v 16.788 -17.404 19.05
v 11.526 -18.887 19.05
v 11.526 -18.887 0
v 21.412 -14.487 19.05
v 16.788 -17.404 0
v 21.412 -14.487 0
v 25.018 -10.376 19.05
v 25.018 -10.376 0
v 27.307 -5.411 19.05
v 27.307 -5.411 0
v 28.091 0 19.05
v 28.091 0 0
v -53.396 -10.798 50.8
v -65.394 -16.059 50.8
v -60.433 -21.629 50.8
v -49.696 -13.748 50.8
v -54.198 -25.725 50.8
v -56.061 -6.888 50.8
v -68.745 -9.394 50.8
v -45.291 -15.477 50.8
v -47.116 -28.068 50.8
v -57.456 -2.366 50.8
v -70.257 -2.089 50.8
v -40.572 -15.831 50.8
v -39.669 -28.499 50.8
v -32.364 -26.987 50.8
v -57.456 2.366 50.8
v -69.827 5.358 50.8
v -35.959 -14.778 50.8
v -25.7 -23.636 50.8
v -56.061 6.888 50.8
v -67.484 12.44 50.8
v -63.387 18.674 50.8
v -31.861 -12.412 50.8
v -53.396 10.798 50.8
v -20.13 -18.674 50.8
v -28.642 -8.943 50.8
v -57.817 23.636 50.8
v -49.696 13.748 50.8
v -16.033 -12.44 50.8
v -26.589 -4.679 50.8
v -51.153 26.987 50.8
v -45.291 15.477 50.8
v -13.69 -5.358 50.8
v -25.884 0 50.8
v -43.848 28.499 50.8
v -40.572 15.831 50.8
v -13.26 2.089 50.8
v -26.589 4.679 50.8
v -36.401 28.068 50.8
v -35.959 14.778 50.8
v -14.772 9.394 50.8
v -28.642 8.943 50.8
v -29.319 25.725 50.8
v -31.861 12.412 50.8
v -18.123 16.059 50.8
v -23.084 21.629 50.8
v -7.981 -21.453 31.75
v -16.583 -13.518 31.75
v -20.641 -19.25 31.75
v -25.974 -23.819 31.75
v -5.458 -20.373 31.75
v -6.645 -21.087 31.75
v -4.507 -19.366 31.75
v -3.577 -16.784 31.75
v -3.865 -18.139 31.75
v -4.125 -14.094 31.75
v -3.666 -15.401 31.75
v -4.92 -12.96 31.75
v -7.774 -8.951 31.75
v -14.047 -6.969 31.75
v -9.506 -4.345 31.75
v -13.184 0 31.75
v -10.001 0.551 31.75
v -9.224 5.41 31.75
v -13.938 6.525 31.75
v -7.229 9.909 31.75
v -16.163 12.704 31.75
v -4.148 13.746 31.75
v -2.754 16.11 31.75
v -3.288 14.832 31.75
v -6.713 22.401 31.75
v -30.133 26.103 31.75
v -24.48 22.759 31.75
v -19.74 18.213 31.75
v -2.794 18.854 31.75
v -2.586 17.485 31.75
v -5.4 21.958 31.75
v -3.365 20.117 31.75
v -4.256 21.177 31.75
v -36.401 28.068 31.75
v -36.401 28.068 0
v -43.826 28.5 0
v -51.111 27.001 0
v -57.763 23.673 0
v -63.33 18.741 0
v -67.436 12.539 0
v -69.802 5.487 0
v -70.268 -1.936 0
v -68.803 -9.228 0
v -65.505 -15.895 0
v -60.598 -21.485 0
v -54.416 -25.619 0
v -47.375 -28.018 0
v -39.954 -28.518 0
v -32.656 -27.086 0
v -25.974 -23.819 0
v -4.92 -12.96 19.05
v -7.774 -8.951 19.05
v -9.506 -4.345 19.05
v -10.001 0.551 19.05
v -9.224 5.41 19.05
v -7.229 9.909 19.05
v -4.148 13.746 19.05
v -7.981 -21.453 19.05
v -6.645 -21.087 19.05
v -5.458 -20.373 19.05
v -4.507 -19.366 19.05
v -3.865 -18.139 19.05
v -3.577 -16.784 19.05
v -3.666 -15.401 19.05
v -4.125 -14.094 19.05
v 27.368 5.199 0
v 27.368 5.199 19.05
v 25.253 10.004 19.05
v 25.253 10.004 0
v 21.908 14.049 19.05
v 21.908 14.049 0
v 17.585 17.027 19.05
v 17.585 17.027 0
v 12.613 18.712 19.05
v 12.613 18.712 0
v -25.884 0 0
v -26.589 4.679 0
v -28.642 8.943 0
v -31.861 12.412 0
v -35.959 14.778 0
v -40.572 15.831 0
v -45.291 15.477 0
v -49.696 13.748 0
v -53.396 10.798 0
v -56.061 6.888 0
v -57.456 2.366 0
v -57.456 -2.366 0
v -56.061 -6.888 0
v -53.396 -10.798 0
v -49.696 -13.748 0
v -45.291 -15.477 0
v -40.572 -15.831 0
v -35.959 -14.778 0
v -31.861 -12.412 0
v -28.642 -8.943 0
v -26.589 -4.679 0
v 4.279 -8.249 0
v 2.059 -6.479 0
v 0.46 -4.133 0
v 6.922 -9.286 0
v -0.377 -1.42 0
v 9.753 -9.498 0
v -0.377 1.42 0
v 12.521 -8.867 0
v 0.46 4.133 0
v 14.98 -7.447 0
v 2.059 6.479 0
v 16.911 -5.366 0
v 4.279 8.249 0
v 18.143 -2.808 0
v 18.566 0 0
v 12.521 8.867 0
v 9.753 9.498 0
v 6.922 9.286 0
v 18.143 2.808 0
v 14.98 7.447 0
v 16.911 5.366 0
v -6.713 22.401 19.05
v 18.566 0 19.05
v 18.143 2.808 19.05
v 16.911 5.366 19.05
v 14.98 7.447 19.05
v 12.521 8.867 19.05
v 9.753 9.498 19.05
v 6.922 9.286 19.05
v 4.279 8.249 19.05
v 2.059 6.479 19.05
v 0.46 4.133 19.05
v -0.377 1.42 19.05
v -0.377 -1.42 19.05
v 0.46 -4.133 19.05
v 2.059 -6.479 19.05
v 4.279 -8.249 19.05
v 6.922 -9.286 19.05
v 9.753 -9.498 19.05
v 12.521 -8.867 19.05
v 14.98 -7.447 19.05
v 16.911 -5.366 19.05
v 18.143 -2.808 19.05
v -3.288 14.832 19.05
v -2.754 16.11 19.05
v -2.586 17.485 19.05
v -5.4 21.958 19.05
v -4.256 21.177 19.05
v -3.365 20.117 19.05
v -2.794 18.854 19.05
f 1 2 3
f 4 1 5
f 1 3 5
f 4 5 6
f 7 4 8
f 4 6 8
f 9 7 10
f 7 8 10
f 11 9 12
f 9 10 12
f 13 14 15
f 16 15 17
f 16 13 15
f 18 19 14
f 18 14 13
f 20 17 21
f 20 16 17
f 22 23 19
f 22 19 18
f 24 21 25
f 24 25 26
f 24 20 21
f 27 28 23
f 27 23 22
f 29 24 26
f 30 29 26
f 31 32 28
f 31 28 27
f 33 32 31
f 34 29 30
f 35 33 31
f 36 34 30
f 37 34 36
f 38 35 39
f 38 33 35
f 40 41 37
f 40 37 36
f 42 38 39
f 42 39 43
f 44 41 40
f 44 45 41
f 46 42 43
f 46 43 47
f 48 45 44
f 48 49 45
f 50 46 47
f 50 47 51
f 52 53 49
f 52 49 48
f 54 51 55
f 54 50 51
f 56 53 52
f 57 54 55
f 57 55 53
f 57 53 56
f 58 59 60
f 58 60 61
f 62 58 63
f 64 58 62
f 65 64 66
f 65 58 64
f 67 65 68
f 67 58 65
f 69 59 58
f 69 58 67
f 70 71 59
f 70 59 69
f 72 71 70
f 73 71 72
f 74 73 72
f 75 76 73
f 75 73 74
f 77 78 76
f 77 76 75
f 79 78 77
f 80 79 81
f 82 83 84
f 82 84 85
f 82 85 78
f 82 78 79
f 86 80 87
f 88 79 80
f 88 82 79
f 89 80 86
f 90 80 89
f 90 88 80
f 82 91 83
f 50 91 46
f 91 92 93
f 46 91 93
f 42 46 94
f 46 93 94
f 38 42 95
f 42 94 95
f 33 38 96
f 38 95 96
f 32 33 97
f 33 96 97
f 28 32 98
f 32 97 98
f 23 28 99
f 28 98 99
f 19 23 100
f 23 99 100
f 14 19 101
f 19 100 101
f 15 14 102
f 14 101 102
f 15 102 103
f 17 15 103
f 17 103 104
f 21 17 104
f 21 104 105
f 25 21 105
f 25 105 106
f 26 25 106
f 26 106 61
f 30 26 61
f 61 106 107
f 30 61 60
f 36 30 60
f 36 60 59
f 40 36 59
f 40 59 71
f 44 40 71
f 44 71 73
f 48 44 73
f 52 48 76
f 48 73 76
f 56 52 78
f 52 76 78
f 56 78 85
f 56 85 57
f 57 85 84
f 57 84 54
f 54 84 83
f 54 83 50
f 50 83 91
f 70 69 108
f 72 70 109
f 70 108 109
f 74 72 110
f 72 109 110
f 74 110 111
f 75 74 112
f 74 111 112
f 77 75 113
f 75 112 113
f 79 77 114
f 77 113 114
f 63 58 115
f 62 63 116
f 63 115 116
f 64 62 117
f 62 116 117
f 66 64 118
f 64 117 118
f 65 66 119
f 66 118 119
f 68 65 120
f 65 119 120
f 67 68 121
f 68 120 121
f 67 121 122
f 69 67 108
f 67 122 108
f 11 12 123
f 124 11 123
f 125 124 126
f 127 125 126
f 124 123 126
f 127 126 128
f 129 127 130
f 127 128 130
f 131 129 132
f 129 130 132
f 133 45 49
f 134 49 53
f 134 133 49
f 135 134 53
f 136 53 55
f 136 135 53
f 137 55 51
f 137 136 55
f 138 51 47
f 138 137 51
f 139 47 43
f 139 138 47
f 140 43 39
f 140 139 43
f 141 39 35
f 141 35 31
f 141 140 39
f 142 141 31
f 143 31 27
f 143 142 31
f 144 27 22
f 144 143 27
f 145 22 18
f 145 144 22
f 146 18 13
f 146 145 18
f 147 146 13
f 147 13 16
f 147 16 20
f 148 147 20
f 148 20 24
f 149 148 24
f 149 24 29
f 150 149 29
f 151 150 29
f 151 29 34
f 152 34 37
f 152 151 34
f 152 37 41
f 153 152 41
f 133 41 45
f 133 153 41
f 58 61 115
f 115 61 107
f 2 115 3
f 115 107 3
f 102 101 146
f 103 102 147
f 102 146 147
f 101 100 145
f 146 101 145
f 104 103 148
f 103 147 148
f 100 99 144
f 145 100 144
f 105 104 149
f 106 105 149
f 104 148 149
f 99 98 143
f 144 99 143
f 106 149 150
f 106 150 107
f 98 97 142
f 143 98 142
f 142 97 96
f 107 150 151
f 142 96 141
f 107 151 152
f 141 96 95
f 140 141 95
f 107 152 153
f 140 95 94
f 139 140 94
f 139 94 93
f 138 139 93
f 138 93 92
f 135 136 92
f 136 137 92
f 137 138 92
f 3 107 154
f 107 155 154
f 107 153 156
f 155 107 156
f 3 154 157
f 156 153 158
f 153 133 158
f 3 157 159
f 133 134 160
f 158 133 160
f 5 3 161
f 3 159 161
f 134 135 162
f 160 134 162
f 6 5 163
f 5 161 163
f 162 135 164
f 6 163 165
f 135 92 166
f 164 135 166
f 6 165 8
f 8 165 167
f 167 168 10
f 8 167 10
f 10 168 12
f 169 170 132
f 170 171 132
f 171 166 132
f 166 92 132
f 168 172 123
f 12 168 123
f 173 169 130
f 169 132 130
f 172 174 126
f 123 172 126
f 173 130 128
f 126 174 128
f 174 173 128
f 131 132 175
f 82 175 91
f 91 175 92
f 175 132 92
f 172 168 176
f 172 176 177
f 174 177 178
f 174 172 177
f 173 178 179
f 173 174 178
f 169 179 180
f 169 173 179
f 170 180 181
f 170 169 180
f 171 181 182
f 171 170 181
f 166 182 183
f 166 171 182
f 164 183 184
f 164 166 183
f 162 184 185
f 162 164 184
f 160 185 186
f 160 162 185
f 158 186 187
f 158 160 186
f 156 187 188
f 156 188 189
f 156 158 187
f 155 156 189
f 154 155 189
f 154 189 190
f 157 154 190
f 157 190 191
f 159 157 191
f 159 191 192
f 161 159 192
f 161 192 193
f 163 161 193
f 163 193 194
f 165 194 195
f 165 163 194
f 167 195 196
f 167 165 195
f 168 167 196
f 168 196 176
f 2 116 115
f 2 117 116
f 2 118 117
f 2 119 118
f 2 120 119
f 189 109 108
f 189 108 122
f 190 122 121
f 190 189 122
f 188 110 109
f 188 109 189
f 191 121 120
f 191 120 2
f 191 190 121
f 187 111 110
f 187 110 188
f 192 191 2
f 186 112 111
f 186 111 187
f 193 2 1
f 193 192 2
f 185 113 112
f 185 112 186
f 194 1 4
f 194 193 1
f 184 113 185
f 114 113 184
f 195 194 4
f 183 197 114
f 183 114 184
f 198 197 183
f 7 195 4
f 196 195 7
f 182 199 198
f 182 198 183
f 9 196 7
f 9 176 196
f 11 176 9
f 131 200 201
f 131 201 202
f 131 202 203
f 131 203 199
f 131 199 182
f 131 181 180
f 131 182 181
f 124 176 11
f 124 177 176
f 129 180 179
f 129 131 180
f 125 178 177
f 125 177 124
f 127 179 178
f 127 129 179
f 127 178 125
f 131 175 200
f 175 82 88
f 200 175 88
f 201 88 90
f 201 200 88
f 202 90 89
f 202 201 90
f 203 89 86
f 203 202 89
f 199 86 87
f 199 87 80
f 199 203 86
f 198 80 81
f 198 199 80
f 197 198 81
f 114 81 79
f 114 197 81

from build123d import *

# Parameters (mm, degrees)
F0_R        = 15.875
F1_DEPTH    = 50.8
F2_DEPTH    = 31.75
F0_R_2      = 9.525
F3_DEPTH    = 19.05
F4_T1_DEPTH = 61.8868884968


# Not quite as in the source:
# - a fillet or chamfer that OpenCascade refuses, or shapes differently, is made with other operations: its cross-section is extruded or revolved along the edge and cut away or added


with BuildPart() as f1:
    # F0 (on Top) → F1 (new body)
    with BuildSketch(Plane.XY):
        with BuildLine():
            ThreePointArc((-25.9736086209, -23.8194207925), (-16.5833436809, -13.5180364382), (-13.1835957324, 0))
            ThreePointArc((-13.1835957324, 0), (-19.7400794655, 18.2130603251), (-36.4007832324, 28.0682110263))
            ThreePointArc((-36.4007832324, 28.0682110263), (-69.7735217146, -5.6297910447), (-25.9736086209, -23.8194207925))
        make_face()
        with Locations((-41.7585957324, 0)):
            Circle(F0_R, mode=Mode.SUBTRACT)
    extrude(amount=F1_DEPTH)

    # F0 (on Top) → F2 (join)
    with BuildSketch(Plane.XY):
        with BuildLine():
            ThreePointArc((-36.4007832324, 28.0682110263), (-19.7400794655, 18.2130603251), (-13.1835957324, 0))
            ThreePointArc((-13.1835957324, 0), (-16.5833436809, -13.5180364382), (-25.9736086209, -23.8194207925))
            Line((-25.9736086209, -23.8194207925), (11.5255643148, -18.8873356739))
            ThreePointArc((11.5255643148, -18.8873356739), (-10.0006293875, 0.5508668403), (12.6132792676, 18.7121406842))
            Line((12.6132792676, 18.7121406842), (-36.4007832324, 28.0682110263))
        make_face()
    extrude(amount=F2_DEPTH)

    # F0 (on Top) → F3 (join)
    with BuildSketch(Plane.XY):
        with BuildLine():
            ThreePointArc((28.0914042676, 0), (23.7204151122, 12.1420402167), (12.6132792676, 18.7121406842))
            ThreePointArc((12.6132792676, 18.7121406842), (-10.0006293875, 0.5508668403), (11.5255643148, -18.8873356739))
            ThreePointArc((11.5255643148, -18.8873356739), (23.3631665352, -12.5614340563), (28.0914042676, 0))
        make_face()
        with Locations((9.0414042676, 0)):
            Circle(F0_R_2, mode=Mode.SUBTRACT)
    extrude(amount=F3_DEPTH)

    # F4: fillet of radius 5.08 on 2 edges, made by hand

    # F4_s2 → F4_t1 (cut)
    with BuildSketch(Plane.XY.offset(19.05)):
        with BuildLine():
            ThreePointArc((-6.7125365301, 22.4011573214), (-2.7943533432, 18.8544597398), (-4.147891099, 13.7457261624))
            ThreePointArc((-4.147891099, 13.7457261624), (3.6293795146, 18.265061951), (12.6132792676, 18.7121406842))
            Line((12.6132792676, 18.7121406842), (-6.7125365301, 22.4011573214))
        make_face()
        with BuildLine():
            ThreePointArc((-7.9811920904, -21.4529651384), (-3.8645283867, -18.1387075787), (-4.9204686565, -12.9602702306))
            ThreePointArc((-4.9204686565, -12.9602702306), (2.5825344428, -17.921648936), (11.5255643148, -18.8873356739))
            Line((11.5255643148, -18.8873356739), (-7.9811920904, -21.4529651384))
        make_face()
    extrude(amount=F4_T1_DEPTH, mode=Mode.SUBTRACT)


solid = f1.part
